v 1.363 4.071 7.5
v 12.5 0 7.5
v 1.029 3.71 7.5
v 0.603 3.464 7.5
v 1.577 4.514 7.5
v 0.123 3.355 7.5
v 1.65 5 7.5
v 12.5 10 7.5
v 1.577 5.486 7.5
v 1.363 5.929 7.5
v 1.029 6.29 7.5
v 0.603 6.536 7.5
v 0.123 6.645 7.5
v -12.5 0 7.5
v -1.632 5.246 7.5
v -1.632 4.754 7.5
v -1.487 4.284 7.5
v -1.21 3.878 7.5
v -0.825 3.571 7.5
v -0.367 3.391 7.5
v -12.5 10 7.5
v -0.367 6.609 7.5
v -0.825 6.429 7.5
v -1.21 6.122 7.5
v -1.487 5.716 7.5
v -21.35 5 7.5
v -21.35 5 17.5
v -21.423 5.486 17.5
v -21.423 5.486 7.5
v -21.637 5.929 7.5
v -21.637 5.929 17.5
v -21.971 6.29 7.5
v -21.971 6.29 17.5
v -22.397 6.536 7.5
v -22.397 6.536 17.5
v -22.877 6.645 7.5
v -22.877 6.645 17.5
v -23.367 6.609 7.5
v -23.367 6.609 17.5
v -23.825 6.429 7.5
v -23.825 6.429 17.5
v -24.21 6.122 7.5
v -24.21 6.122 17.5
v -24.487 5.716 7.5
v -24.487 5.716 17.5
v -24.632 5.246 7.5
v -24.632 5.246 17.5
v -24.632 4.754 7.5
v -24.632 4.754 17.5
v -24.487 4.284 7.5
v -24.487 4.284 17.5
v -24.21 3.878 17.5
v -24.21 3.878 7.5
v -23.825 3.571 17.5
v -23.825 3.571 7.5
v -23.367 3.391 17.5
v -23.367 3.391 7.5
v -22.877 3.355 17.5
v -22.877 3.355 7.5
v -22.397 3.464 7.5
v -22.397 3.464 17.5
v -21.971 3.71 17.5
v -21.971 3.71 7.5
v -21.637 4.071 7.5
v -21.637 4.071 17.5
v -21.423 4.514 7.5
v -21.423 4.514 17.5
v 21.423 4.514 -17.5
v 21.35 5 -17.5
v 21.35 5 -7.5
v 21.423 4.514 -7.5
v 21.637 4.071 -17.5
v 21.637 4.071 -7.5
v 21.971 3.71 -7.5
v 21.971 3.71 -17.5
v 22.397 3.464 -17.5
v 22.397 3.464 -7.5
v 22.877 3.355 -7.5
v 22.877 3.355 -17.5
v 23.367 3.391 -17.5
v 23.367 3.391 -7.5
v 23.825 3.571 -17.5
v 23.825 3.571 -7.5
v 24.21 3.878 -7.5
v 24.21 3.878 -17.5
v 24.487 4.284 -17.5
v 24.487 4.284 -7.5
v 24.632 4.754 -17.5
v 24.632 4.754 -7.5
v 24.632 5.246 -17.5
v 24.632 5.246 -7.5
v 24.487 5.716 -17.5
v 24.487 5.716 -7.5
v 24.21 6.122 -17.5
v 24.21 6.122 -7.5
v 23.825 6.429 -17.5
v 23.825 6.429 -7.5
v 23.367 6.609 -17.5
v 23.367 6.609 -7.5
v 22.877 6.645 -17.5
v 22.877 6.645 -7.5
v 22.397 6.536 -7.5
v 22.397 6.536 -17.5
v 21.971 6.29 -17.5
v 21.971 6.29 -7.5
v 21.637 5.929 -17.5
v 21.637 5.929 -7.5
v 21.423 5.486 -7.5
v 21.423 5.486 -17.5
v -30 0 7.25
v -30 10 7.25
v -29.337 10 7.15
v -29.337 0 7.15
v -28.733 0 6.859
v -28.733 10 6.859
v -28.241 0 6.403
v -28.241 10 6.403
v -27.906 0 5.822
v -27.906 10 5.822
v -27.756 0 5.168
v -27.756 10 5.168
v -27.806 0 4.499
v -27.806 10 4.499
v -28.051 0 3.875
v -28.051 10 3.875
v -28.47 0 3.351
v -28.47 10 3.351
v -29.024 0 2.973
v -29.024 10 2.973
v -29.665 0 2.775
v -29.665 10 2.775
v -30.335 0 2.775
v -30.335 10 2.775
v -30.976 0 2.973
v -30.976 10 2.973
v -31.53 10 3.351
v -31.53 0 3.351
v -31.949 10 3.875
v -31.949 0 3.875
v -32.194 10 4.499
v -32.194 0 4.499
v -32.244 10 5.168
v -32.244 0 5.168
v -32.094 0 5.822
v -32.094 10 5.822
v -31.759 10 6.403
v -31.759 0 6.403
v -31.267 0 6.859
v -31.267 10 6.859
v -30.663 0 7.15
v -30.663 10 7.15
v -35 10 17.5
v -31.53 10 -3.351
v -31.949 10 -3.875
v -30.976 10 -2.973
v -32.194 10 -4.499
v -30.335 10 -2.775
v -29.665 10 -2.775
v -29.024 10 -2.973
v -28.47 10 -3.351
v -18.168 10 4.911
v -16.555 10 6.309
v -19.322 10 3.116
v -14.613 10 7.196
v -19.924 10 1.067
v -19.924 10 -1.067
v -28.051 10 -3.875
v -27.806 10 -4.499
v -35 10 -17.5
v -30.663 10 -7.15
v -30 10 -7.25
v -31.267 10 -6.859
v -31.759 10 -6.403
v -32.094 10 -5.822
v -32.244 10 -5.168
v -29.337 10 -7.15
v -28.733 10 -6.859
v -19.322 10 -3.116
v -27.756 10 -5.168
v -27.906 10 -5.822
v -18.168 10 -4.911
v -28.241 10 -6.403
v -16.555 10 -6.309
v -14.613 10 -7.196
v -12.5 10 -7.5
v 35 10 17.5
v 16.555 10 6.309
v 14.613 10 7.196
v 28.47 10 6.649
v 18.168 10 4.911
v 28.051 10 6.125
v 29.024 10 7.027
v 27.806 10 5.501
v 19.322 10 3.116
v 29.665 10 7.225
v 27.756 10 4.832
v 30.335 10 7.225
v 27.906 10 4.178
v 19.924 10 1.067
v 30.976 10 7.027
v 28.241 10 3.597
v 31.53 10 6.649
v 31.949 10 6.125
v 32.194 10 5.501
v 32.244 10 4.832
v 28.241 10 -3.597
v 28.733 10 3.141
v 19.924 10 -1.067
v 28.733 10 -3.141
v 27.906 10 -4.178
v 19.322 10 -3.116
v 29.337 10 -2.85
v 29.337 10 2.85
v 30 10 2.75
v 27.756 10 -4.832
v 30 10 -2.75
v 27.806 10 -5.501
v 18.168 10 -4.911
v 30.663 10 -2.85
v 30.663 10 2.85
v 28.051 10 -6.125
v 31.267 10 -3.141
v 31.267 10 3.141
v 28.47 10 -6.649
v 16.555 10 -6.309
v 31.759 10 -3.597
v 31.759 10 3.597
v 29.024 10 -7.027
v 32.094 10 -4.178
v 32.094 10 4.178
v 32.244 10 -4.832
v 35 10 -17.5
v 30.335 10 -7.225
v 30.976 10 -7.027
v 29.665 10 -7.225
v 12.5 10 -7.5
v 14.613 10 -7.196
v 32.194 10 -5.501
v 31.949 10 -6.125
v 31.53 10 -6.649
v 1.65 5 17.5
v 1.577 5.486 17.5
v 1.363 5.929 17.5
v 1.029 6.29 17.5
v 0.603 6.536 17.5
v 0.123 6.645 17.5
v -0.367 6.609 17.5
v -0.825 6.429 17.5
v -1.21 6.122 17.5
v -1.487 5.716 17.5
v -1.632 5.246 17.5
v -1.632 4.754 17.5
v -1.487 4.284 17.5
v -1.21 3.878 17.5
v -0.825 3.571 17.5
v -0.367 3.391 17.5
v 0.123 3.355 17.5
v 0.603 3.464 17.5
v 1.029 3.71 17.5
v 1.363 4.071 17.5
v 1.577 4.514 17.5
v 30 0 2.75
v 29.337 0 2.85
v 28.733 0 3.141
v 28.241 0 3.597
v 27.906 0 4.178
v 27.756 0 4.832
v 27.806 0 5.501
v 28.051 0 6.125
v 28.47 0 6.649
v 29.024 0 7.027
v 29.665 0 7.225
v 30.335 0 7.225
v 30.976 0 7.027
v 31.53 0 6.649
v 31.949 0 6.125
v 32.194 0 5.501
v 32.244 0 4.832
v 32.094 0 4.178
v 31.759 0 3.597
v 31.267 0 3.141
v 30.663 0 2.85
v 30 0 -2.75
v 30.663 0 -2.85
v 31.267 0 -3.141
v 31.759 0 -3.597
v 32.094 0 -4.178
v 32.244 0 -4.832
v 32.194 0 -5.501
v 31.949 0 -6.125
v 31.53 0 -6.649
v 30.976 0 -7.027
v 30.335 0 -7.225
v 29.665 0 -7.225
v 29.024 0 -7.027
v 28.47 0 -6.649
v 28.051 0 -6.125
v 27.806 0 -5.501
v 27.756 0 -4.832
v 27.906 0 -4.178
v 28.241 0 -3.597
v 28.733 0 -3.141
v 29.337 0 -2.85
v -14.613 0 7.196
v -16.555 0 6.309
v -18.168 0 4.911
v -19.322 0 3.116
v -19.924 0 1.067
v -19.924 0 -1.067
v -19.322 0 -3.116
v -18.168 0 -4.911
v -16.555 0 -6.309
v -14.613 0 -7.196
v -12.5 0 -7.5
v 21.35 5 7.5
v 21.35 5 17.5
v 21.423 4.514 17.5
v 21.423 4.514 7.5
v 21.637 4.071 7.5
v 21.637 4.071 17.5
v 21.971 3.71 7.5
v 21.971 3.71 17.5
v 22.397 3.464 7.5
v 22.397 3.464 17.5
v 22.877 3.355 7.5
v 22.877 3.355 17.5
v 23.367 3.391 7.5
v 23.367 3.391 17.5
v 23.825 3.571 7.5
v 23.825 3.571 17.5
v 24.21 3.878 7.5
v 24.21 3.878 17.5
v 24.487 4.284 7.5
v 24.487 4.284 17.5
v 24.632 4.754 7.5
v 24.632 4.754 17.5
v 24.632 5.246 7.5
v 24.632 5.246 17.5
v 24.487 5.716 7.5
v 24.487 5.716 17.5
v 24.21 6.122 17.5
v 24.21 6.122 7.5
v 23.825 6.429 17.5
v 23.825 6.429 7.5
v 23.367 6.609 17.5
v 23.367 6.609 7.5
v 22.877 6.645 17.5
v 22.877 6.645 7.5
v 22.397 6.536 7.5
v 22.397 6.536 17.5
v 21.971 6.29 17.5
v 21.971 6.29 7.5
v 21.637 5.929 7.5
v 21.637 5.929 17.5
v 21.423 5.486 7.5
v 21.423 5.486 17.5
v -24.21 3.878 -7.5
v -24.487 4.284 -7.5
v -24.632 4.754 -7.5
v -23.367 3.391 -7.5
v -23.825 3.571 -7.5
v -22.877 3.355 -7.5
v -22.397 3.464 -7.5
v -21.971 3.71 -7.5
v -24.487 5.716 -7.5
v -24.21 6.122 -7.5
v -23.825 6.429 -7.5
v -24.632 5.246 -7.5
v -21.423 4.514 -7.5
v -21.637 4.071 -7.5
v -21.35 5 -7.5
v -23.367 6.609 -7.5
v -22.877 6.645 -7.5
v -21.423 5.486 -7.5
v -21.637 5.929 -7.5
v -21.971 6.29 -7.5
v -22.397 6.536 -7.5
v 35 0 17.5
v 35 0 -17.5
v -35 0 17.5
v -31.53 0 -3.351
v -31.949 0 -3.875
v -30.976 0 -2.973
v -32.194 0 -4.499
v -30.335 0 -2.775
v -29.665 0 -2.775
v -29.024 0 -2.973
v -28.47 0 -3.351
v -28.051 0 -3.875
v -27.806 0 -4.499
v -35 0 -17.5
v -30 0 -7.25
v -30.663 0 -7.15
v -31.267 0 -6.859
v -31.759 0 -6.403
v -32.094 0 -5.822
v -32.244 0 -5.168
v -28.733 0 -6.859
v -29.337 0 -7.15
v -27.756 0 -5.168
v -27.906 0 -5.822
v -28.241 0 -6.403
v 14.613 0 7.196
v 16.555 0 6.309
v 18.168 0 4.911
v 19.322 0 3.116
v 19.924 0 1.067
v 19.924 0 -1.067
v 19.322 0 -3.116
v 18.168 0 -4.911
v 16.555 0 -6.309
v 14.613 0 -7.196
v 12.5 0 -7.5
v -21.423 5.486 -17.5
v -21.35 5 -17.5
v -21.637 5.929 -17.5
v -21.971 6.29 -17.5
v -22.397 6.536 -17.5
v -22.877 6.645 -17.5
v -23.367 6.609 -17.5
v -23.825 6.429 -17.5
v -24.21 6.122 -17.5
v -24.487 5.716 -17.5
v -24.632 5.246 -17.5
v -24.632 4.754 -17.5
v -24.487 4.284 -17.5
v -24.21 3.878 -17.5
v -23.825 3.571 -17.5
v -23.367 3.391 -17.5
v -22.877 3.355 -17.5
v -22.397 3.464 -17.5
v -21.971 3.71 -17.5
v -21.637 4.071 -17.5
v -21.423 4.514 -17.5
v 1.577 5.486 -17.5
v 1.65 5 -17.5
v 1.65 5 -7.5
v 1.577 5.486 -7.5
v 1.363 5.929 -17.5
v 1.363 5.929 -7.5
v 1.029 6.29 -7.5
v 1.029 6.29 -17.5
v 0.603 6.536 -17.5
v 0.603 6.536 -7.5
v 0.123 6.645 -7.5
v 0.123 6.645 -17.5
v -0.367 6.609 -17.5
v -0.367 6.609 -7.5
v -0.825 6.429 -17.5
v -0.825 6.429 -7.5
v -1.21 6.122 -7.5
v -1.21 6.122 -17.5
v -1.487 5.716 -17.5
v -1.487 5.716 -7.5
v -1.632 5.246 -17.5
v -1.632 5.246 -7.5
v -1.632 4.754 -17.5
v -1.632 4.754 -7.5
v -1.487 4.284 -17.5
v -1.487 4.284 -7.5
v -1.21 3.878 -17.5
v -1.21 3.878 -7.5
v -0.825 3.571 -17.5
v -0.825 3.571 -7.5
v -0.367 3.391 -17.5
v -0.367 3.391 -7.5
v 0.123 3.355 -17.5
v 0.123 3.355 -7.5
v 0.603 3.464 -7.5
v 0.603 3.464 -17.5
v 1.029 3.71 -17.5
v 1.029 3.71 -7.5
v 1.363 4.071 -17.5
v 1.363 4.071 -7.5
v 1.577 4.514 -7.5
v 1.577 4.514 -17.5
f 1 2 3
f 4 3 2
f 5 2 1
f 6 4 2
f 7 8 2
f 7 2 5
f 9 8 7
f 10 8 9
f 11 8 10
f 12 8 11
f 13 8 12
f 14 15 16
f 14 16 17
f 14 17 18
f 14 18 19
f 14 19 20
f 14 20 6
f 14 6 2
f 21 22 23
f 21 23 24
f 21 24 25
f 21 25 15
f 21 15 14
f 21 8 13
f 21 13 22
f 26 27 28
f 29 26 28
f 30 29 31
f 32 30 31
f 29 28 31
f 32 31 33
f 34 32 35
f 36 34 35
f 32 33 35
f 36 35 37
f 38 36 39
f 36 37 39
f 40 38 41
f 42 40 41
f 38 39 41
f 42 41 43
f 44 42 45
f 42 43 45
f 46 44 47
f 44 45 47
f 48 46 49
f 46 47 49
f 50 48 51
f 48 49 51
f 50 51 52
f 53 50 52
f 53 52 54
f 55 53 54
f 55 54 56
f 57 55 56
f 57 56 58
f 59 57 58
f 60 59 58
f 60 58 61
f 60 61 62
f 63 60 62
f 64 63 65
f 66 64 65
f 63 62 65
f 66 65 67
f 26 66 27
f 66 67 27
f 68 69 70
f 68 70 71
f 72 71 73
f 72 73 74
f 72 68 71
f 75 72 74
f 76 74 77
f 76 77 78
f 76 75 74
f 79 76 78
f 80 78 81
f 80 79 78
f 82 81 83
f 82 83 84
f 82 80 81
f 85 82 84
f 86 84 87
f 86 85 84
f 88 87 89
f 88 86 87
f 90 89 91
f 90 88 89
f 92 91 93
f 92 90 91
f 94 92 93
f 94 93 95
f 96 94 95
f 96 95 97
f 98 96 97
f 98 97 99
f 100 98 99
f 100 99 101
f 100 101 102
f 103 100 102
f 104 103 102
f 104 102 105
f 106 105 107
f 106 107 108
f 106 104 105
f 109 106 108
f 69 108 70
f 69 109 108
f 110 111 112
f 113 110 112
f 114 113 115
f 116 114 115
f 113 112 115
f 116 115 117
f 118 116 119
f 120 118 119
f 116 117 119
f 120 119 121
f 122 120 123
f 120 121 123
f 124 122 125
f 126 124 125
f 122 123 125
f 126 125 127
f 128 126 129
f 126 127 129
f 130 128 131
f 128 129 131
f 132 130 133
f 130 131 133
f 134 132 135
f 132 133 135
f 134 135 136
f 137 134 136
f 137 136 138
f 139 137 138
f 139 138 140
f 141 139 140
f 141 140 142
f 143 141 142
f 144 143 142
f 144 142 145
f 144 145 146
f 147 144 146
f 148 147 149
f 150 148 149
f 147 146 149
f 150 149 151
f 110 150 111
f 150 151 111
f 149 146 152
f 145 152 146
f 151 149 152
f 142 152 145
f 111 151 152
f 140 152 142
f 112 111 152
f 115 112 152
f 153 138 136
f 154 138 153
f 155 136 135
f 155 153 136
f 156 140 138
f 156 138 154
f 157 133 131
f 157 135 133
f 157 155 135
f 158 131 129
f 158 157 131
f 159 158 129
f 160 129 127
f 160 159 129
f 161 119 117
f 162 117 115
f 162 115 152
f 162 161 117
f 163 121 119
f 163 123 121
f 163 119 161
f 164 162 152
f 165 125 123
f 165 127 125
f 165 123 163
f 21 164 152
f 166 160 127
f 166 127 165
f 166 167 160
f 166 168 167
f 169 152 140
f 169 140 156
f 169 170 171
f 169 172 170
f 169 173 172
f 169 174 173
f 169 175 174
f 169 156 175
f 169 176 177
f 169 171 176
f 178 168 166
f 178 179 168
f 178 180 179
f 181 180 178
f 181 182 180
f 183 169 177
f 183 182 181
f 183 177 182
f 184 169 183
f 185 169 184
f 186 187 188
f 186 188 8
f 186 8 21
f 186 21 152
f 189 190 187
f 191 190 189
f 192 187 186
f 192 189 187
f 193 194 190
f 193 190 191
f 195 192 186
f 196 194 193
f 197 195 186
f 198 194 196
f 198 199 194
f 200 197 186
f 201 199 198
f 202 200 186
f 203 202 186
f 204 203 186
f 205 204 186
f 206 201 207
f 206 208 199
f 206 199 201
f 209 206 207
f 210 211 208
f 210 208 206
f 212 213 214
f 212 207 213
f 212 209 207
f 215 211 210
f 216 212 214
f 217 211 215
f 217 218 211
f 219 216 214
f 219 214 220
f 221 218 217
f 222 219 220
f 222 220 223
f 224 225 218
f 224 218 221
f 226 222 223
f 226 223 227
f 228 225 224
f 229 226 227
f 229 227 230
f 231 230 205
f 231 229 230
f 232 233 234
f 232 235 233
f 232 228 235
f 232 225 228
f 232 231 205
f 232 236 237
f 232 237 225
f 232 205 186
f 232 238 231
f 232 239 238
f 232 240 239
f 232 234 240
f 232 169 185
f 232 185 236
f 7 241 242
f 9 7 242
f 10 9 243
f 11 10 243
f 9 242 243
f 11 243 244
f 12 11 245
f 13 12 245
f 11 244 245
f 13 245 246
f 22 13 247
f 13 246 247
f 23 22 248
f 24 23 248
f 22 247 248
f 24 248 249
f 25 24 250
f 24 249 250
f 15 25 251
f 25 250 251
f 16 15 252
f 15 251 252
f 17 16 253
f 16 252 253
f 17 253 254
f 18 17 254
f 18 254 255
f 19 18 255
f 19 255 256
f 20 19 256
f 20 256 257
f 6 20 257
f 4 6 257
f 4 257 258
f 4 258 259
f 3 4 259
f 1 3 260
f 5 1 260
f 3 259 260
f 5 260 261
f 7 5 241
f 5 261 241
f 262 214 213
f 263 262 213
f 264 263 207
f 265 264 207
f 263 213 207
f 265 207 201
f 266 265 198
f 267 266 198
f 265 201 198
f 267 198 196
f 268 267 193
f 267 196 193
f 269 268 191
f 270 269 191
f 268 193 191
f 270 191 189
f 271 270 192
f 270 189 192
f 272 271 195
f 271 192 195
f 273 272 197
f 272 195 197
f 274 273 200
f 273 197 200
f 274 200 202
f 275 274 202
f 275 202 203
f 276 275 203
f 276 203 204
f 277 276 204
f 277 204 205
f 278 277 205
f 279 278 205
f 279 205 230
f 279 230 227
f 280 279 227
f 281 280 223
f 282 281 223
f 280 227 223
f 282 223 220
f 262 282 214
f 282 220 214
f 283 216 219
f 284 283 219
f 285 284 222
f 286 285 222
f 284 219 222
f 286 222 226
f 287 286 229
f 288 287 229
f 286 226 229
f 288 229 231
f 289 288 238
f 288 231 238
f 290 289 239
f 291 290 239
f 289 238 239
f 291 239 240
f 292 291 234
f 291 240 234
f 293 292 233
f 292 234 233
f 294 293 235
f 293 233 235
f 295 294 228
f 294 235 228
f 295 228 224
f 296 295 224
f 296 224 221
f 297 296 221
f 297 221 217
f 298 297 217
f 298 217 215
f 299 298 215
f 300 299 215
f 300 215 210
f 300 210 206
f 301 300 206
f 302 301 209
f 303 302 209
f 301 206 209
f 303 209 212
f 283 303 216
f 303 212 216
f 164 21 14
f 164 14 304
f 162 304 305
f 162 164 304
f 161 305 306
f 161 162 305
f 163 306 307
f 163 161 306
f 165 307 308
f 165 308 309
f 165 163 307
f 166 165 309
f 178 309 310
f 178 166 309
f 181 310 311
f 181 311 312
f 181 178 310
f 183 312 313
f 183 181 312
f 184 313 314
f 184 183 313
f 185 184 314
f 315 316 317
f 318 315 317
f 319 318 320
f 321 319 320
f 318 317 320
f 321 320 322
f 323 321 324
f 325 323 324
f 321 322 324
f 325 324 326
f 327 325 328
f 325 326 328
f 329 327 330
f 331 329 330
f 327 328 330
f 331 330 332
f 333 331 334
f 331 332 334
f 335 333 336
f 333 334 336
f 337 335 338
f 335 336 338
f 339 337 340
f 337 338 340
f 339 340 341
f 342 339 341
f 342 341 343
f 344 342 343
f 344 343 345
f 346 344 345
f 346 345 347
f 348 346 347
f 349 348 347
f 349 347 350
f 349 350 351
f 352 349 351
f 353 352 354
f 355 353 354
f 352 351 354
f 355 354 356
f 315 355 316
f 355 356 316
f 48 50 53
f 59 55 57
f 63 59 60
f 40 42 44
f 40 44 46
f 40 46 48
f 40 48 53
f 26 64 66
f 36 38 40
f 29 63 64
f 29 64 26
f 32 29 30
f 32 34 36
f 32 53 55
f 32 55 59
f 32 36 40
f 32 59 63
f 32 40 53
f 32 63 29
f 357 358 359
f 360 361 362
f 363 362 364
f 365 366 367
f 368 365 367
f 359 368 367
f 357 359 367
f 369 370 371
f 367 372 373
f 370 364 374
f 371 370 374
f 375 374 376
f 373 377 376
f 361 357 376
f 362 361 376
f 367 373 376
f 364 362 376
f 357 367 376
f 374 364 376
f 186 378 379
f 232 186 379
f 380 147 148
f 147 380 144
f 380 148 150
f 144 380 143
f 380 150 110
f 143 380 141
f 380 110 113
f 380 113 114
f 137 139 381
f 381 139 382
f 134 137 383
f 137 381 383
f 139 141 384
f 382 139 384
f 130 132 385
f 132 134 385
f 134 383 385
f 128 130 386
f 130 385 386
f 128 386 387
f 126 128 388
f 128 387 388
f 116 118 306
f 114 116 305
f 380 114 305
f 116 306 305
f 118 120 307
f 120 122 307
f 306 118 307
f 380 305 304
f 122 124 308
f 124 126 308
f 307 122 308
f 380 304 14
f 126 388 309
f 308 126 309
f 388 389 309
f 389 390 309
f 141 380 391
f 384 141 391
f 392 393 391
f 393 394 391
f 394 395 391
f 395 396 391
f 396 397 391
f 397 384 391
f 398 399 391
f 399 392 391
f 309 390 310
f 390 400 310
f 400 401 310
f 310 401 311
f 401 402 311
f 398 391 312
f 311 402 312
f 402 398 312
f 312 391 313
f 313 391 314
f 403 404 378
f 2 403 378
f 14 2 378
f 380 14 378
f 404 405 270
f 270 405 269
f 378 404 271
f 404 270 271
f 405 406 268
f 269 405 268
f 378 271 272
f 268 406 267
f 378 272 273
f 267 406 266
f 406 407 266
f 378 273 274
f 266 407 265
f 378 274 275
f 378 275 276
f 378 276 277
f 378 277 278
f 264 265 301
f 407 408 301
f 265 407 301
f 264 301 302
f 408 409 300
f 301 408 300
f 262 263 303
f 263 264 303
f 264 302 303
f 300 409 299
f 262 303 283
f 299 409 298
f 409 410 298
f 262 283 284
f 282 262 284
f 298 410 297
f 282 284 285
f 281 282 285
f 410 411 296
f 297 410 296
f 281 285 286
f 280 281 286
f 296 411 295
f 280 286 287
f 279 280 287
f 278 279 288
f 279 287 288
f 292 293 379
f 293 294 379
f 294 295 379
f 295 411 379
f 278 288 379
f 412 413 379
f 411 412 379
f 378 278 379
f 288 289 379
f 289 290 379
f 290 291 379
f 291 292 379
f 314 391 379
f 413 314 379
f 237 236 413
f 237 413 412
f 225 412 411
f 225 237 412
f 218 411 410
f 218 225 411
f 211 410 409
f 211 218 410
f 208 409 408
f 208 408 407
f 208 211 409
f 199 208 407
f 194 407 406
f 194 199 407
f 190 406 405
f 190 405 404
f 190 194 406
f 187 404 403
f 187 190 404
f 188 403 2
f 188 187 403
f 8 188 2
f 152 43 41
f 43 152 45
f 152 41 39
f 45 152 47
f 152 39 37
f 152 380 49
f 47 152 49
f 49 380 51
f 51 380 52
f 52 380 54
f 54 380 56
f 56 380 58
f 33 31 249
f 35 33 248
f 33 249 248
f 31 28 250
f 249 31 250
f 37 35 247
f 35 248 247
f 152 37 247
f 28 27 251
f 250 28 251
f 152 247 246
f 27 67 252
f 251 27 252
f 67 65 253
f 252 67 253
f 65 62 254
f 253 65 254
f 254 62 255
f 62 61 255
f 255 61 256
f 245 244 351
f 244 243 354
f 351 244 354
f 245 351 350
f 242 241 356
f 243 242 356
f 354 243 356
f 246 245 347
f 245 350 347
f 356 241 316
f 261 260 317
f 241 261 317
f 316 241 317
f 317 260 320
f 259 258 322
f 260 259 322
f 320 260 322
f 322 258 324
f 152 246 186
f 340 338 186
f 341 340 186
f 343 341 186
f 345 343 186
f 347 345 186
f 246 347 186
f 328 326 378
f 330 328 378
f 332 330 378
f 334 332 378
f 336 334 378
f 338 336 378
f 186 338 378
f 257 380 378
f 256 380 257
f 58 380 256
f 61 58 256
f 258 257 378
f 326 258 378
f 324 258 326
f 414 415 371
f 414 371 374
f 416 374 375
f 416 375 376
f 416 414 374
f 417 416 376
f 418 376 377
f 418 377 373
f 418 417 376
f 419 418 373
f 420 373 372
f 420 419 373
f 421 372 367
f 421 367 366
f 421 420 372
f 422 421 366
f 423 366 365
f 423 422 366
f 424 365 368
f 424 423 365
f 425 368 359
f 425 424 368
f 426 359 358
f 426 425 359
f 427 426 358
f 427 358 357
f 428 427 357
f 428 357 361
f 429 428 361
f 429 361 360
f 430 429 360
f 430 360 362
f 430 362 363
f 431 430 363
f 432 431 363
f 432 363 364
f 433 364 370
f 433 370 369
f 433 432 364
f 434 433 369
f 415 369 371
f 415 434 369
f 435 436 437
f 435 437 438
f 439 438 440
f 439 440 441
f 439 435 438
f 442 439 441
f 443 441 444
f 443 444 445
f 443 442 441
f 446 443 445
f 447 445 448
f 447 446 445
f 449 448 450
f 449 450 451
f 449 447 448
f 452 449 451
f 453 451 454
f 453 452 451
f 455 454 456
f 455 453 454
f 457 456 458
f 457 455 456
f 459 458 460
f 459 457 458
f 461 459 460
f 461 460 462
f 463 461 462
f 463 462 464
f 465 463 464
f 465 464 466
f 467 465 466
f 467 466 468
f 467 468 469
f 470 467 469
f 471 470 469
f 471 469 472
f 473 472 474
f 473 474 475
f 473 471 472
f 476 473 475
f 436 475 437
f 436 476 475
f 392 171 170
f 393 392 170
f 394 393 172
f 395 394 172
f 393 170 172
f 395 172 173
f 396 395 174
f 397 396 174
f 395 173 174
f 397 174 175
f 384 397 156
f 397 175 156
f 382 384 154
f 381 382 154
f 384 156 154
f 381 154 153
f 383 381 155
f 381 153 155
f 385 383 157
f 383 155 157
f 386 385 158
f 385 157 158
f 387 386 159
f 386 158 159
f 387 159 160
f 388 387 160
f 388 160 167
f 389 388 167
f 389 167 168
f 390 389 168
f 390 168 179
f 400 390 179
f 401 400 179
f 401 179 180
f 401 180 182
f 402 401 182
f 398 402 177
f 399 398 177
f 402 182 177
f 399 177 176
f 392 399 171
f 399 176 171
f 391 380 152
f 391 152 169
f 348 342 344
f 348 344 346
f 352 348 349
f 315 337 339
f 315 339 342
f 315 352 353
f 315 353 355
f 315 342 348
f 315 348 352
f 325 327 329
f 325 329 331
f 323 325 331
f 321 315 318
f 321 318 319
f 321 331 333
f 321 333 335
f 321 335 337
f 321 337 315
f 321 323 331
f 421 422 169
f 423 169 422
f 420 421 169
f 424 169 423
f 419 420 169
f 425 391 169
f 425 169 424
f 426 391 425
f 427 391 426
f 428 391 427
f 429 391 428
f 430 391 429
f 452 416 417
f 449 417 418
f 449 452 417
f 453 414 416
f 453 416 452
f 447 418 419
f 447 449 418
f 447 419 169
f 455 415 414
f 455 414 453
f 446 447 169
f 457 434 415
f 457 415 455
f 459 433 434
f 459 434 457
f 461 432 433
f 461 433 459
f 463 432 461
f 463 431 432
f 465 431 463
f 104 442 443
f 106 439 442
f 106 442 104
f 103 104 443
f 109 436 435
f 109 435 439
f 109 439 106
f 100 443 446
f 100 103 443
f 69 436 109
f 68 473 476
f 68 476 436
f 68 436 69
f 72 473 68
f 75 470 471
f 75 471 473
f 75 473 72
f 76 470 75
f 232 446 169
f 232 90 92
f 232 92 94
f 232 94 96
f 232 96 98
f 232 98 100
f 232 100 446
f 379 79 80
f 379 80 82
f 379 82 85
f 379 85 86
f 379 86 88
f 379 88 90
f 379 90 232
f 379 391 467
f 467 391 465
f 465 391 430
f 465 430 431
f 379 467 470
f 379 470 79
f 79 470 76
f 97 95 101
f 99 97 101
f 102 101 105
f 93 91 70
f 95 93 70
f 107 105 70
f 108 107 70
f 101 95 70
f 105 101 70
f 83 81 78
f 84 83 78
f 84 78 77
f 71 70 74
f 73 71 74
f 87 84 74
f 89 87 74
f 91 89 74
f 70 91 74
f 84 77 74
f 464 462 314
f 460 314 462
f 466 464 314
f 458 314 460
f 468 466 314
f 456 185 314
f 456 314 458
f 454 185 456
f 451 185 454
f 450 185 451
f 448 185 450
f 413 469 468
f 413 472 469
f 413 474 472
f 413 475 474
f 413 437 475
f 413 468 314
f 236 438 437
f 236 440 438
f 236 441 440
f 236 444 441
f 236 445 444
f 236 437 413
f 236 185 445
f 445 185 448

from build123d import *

# Parameters (mm, degrees)
SKETCH1_W           = 70
SKETCH1_H           = 35
BOSS_EXTRUDE1_DEPTH = 10
SKETCH2_R           = 1.65
CUT_EXTRUDE1_DEPTH  = 10
CUT_EXTRUDE2_DEPTH  = 10
SKETCH4_R           = 2.25
CUT_EXTRUDE3_DEPTH  = 10


with BuildPart() as part:
    # Sketch1 → Boss-Extrude1 (new body)
    with BuildSketch(Plane(origin=(0, 0, 0), x_dir=(1, 0, 0), z_dir=(0, 1, 0))):
        Rectangle(SKETCH1_W, SKETCH1_H)
    extrude(amount=BOSS_EXTRUDE1_DEPTH)

    # Sketch2 → Cut-Extrude1 (cut)
    with BuildSketch(Plane.XY.offset(17.5)):
        with Locations((-23, 5)):
            Circle(SKETCH2_R)
        with Locations((0, 5)):
            Circle(SKETCH2_R)
        with Locations(Location((23, 5, 0), (0, 0, 180))):
            Circle(SKETCH2_R)
    cut_extrude1 = extrude(amount=-CUT_EXTRUDE1_DEPTH, mode=Mode.SUBTRACT)

    # Sketch3 → Cut-Extrude2 (cut)
    with BuildSketch(Plane(origin=(0, 10, 0), x_dir=(1, 0, 0), z_dir=(0, 1, 0))):
        with BuildLine():
            Line((-12.5, 7.5), (12.5, 7.5))
            ThreePointArc((12.5, 7.5), (20, 0), (12.5, -7.5))
            Line((12.5, -7.5), (-12.5, -7.5))
            ThreePointArc((-12.5, -7.5), (-20, 0), (-12.5, 7.5))
        make_face()
    extrude(amount=-CUT_EXTRUDE2_DEPTH, mode=Mode.SUBTRACT)

    # Sketch4 → Cut-Extrude3 (cut)
    with BuildSketch(Plane(origin=(0, 10, 0), x_dir=(1, 0, 0), z_dir=(0, 1, 0))):
        with Locations(Location((-30, -5, 0), (0, 0, 270))):
            Circle(SKETCH4_R)
        with Locations(Location((-30, 5, 0), (0, 0, 90))):
            Circle(SKETCH4_R)
        with Locations(Location((30, -5, 0), (0, 0, 90))):
            Circle(SKETCH4_R)
        with Locations(Location((30, 5, 0), (0, 0, 270))):
            Circle(SKETCH4_R)
    extrude(amount=-CUT_EXTRUDE3_DEPTH, mode=Mode.SUBTRACT)

    # Mirror1: Cut-Extrude1 across plane
    add(cut_extrude1.mirror(Plane.XY), mode=Mode.SUBTRACT)


solid = part.part
